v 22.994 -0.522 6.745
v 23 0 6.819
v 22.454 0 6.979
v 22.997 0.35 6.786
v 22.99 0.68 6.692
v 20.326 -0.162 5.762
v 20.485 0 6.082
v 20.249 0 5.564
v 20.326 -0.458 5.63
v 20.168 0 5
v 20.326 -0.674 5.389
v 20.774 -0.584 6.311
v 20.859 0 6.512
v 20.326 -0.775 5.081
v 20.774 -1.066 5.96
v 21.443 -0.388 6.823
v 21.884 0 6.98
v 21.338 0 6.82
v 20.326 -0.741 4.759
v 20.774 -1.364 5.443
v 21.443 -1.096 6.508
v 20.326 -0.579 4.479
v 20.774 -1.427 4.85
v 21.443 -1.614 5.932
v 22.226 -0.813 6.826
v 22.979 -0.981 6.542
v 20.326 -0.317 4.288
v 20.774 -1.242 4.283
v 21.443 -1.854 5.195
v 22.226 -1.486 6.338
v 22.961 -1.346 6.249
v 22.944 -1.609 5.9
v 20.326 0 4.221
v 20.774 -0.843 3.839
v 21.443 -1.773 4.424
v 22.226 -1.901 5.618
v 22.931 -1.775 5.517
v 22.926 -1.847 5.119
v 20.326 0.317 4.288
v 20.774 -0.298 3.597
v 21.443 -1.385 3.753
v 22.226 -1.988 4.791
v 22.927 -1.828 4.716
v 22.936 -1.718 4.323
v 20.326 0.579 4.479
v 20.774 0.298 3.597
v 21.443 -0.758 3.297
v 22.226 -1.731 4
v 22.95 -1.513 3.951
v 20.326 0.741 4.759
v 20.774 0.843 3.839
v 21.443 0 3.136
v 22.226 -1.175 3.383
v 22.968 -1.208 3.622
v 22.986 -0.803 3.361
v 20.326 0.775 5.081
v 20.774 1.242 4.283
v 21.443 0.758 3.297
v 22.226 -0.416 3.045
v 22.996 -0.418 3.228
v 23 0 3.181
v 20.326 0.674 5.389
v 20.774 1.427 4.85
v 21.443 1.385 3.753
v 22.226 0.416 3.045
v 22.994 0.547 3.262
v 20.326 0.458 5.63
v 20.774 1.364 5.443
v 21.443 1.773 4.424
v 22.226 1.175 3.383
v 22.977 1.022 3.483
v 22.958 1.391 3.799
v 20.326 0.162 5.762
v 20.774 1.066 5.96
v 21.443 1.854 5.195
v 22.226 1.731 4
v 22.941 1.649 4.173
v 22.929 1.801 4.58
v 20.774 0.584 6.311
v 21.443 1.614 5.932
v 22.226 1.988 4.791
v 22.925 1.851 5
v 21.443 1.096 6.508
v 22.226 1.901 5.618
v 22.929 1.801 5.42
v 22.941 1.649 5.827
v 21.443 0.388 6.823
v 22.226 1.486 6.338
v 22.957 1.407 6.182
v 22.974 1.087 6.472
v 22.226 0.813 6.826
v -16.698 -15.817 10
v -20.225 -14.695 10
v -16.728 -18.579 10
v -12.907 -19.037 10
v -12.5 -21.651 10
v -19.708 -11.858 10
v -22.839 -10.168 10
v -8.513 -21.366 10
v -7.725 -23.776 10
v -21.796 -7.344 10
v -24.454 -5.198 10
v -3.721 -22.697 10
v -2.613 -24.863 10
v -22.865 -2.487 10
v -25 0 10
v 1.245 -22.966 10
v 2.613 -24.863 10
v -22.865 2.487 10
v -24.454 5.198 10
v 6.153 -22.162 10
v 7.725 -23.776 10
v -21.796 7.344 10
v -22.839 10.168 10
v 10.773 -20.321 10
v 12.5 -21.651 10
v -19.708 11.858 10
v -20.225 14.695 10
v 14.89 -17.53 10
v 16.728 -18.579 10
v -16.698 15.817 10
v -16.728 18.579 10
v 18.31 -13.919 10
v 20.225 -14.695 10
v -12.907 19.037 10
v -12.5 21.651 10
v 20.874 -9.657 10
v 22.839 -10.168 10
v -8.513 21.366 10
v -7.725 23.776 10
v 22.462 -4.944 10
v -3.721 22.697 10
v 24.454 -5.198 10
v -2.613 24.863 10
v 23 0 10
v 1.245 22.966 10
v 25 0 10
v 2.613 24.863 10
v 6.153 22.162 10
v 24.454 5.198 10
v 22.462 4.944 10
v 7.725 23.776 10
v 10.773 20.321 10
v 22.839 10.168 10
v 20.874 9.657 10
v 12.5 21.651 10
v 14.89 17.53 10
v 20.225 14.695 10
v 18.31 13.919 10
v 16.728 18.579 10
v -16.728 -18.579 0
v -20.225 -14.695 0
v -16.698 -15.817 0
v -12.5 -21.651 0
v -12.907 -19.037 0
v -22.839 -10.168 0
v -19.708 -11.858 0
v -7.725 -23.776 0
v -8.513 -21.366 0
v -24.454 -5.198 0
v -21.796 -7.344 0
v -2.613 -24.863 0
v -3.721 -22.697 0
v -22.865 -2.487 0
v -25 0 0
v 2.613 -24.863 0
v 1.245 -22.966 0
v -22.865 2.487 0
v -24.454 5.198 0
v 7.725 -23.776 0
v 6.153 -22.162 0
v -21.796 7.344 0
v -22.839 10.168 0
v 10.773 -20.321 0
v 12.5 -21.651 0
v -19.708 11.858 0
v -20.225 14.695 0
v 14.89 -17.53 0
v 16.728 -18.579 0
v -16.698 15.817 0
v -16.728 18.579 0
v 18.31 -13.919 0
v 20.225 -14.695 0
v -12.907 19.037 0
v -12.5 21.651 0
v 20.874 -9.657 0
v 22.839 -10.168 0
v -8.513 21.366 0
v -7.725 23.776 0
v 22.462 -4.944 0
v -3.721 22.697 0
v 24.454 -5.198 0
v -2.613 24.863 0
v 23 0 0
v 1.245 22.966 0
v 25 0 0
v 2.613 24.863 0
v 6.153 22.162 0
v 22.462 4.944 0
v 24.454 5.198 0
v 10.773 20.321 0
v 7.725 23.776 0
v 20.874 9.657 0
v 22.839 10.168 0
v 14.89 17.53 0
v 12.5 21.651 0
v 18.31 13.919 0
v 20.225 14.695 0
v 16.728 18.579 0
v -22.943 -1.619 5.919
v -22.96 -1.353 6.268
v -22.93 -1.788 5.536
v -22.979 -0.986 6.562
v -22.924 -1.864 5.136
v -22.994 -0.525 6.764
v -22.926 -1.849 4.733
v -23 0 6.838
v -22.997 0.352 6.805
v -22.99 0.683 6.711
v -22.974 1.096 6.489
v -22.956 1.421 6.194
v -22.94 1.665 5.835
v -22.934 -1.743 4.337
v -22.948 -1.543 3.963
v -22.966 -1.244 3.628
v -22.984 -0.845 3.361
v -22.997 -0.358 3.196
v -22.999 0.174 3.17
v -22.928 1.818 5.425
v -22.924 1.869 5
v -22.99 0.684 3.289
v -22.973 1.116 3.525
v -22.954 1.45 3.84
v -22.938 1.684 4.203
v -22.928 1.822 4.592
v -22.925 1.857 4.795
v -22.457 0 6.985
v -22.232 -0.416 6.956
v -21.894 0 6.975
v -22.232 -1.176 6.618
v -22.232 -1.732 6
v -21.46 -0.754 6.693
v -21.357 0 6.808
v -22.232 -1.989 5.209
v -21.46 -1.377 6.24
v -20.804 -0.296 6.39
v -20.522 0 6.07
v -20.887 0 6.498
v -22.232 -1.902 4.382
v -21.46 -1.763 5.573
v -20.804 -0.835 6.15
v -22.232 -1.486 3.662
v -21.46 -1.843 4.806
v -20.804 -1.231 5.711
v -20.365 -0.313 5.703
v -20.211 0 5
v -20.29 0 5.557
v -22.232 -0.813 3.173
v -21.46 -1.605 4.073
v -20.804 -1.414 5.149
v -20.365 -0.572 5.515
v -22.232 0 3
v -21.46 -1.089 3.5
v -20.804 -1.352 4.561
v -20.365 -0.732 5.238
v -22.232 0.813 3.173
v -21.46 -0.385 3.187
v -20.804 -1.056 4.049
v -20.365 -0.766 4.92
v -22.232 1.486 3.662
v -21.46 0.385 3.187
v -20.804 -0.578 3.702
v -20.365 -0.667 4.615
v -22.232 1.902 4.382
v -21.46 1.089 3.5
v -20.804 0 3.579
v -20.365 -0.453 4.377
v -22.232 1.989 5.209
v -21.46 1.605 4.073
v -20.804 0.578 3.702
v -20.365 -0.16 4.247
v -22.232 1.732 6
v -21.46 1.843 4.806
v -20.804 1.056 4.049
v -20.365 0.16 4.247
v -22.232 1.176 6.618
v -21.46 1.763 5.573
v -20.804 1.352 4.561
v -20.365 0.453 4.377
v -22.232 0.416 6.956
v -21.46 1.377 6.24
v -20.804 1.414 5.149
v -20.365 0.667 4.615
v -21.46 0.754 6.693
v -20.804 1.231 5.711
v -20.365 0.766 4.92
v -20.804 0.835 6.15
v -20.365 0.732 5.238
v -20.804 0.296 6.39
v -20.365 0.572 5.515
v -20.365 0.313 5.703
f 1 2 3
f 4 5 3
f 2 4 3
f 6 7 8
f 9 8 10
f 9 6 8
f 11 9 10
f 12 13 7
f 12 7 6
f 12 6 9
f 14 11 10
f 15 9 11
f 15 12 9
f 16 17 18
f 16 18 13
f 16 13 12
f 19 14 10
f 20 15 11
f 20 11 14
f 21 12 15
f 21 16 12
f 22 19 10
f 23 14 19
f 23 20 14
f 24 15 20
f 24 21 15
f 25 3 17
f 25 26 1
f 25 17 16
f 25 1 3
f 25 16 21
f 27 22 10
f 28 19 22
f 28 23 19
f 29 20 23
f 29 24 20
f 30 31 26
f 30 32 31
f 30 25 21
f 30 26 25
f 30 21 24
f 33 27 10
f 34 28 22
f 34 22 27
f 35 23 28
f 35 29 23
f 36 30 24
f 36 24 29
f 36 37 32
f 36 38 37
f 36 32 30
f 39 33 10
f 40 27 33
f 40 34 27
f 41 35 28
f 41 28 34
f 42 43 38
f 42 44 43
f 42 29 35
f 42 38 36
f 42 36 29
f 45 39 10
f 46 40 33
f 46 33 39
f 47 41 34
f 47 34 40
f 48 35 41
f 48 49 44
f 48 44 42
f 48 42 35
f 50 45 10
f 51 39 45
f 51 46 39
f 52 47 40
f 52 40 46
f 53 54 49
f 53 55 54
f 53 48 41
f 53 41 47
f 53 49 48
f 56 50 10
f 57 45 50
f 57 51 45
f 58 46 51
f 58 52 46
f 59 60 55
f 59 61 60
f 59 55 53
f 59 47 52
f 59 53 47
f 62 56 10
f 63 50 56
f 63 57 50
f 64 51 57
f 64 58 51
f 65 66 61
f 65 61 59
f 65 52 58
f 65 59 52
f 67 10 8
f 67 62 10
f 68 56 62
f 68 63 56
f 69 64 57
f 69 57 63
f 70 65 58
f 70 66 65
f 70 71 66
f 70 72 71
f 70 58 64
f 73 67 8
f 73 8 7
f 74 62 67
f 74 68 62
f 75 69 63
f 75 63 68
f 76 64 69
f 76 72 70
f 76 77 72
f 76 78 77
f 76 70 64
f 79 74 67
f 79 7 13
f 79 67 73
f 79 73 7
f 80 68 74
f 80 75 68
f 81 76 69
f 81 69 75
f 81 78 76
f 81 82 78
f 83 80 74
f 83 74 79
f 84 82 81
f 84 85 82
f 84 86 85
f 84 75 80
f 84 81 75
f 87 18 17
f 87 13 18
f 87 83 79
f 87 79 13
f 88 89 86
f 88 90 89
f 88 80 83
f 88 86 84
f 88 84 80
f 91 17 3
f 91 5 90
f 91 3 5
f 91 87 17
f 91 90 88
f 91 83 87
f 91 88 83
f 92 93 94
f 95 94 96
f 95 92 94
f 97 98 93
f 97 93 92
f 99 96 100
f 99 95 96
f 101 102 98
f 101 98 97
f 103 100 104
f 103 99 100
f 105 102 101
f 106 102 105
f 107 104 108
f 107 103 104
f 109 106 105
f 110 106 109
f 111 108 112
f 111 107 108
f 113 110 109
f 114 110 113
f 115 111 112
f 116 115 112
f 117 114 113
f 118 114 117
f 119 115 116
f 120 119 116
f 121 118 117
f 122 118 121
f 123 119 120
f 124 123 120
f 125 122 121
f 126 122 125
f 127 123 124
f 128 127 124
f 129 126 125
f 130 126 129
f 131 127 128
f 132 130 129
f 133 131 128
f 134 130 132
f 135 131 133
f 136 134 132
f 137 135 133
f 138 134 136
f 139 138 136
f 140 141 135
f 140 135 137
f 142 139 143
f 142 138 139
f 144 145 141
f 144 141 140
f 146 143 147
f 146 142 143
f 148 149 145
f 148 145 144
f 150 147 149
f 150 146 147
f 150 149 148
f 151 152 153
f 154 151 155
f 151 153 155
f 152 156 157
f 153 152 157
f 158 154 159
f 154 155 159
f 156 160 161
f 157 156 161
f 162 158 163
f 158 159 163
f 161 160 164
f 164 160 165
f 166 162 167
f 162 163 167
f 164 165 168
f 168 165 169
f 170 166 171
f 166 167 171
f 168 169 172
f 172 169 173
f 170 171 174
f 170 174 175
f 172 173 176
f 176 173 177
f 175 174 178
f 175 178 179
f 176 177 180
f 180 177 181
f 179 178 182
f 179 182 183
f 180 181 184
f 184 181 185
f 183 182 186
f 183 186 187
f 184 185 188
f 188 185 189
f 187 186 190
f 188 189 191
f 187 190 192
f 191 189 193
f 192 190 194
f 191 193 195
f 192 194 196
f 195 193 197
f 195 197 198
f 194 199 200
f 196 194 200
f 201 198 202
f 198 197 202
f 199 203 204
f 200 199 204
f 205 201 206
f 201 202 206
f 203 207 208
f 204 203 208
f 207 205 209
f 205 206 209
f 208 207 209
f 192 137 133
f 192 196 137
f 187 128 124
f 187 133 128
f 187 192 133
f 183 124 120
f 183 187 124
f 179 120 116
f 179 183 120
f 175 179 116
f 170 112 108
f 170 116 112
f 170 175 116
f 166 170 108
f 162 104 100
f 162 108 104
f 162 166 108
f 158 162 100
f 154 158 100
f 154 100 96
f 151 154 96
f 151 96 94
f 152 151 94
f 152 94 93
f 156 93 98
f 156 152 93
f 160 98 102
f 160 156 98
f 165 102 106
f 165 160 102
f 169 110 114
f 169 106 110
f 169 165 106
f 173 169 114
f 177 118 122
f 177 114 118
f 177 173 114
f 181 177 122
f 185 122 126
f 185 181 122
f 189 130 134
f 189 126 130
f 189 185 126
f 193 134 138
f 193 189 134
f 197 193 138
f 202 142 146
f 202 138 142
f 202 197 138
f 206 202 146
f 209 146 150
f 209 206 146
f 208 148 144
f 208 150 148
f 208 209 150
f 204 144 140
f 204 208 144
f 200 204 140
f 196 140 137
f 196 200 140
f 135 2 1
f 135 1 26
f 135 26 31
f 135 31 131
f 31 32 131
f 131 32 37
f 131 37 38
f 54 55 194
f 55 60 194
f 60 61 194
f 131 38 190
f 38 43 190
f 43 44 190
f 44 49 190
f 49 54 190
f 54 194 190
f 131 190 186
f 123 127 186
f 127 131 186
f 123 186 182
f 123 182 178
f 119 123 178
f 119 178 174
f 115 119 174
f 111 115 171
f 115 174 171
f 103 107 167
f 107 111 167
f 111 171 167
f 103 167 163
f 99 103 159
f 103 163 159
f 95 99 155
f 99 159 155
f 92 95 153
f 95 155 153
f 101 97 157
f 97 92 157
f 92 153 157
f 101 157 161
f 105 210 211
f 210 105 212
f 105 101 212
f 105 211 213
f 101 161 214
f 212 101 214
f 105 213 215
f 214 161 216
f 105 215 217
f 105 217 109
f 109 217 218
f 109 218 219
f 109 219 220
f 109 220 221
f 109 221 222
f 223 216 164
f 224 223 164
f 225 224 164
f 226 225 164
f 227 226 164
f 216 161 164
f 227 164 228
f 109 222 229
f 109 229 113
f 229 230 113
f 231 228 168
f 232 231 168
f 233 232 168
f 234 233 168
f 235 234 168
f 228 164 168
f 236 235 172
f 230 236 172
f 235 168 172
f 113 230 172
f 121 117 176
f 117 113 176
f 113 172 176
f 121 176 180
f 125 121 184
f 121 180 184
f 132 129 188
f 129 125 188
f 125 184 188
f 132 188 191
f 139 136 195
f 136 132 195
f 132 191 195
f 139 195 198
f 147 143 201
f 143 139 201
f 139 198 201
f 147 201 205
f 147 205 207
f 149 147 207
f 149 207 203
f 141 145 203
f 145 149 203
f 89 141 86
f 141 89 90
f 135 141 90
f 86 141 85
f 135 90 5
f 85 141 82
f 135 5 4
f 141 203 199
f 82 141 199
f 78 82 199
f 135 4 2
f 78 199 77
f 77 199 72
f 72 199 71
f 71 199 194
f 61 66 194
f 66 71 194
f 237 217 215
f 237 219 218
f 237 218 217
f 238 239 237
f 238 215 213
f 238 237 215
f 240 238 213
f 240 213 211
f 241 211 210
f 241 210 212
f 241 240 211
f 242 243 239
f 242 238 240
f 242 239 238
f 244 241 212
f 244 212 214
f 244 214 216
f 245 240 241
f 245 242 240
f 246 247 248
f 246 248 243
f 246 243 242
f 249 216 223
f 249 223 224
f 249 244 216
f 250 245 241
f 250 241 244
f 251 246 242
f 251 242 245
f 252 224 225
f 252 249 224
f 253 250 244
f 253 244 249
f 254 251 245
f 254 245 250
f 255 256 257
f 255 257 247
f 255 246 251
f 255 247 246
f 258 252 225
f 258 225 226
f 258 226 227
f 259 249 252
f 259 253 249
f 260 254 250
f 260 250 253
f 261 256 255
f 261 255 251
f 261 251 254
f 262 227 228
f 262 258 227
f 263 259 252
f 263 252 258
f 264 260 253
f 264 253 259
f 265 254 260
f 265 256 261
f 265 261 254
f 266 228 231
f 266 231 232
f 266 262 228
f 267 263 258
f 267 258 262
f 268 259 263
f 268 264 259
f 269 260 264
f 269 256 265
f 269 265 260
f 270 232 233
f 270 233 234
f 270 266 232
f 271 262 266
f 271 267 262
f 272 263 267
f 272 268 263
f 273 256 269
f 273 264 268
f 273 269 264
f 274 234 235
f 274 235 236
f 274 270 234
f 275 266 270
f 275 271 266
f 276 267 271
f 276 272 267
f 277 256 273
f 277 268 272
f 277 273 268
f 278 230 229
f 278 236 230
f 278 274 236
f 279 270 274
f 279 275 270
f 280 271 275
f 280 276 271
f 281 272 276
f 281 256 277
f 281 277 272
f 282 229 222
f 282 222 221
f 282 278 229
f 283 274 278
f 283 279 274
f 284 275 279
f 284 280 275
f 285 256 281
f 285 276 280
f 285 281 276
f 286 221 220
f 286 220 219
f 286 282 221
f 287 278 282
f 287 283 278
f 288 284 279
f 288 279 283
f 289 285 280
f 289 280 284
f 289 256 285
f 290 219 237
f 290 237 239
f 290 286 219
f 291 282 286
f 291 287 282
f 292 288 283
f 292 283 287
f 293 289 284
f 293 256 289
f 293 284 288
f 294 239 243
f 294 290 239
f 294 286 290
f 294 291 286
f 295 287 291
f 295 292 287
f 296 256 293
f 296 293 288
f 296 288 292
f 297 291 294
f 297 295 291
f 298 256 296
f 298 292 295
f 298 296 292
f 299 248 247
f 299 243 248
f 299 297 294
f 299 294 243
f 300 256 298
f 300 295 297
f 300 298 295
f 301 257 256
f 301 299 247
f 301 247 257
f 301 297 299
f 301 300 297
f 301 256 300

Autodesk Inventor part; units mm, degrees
ref_plane "YZ Plane" through (0, 0, 0) normal (1, 0, 0) x (0, 1, 0)
ref_plane "XZ Plane" through (0, 0, 0) normal (0, 1, 0) x (-1, 0, 0)
ref_plane "XY Plane" through (0, 0, 0) normal (0, 0, 1) x (1, 0, 0)
sketch "Sketch1" plane through (0, 0, 0) normal (0, 0, 1) x (1, 0, 0)
  circle A0 centre (0, 0) radius 25
  circle A1 centre (0, 0) radius 23
  circle A2 centre (0, 0) radius 22
  circle A3 centre (0, 0) radius 20
  circle A4 centre (0, 0) radius 19
  circle A5 centre (0, 0) radius 17
  line L0 (25, 0) -> (-25, 0) construction
  line L1 (0, 25) -> (0, -25) construction
  dimension "d0" = 50
  dimension "d1" = 2
  dimension "d2" = 44
  dimension "d3" = 2
  dimension "d4" = 38
  dimension "d5" = 2
extrude "Extrusion2" add sketch "Sketch1" along normal blind 10 contours A0
sketch "Sketch2" plane through (0, 0, 0) normal (0, 1, 0) x (-1, 0, 0)
  line L0 (-23, 0) -> (23, 0) construction
  line L1 (23, 0) -> (-23, 0) construction
  line L2 (-23, 0) -> (-23, 10) construction
  line L3 (23, 10) -> (23, 0) construction
  line L4 (23, 10) -> (23, 0) construction
  circle A0 centre (23, 5) radius 2 construction
  line L5 (0, 0) -> (0, 10) construction
  circle A1 centre (-23, 5) radius 2 construction
  line L6 (24.0412, 3.2924) -> (23, 7)
  line L7 (-23, 0) -> (-23, 10)
  line L8 (23, 10) -> (23, 0) construction
  line L9 (-23, 5) -> (23, 5) construction
  line L10 (23, 10) -> (23, 0) construction
  circle A2 centre (-22.1677, 5) radius 2
  circle A3 centre (22.2113, 5) radius 2
  line L11 (20.2113, 5) -> (24.2113, 5)
  line L12 (-20.1677, 5) -> (-24.1677, 5)
  point P0 (-23, 7)
  point P1 (-23, 3)
  dimension "d12" = 4
  dimension "d11" = 10
  dimension "d31" = 46
  dimension "d32" = 4
  dimension "d33" = 4
revolve "Revolution1" add sketch "Sketch2" angle 360 about axis through (23, 0, 5) along (-1, 0, 0) picked at (21.3446, 5.1473) picked at (23.3511, 6.1311) contours L11 A3 L6 | L6 A3 L11
revolve "Revolution2" add sketch "Sketch2" angle 360 about axis through (23, 0, 5) along (-1, 0, 0) picked at (-23.13, 6.1339) picked at (-21.1282, 5.1469) contours L12 A2 L7 | L7 A2 L12
properties part number "probe_gimbal_prototype"
